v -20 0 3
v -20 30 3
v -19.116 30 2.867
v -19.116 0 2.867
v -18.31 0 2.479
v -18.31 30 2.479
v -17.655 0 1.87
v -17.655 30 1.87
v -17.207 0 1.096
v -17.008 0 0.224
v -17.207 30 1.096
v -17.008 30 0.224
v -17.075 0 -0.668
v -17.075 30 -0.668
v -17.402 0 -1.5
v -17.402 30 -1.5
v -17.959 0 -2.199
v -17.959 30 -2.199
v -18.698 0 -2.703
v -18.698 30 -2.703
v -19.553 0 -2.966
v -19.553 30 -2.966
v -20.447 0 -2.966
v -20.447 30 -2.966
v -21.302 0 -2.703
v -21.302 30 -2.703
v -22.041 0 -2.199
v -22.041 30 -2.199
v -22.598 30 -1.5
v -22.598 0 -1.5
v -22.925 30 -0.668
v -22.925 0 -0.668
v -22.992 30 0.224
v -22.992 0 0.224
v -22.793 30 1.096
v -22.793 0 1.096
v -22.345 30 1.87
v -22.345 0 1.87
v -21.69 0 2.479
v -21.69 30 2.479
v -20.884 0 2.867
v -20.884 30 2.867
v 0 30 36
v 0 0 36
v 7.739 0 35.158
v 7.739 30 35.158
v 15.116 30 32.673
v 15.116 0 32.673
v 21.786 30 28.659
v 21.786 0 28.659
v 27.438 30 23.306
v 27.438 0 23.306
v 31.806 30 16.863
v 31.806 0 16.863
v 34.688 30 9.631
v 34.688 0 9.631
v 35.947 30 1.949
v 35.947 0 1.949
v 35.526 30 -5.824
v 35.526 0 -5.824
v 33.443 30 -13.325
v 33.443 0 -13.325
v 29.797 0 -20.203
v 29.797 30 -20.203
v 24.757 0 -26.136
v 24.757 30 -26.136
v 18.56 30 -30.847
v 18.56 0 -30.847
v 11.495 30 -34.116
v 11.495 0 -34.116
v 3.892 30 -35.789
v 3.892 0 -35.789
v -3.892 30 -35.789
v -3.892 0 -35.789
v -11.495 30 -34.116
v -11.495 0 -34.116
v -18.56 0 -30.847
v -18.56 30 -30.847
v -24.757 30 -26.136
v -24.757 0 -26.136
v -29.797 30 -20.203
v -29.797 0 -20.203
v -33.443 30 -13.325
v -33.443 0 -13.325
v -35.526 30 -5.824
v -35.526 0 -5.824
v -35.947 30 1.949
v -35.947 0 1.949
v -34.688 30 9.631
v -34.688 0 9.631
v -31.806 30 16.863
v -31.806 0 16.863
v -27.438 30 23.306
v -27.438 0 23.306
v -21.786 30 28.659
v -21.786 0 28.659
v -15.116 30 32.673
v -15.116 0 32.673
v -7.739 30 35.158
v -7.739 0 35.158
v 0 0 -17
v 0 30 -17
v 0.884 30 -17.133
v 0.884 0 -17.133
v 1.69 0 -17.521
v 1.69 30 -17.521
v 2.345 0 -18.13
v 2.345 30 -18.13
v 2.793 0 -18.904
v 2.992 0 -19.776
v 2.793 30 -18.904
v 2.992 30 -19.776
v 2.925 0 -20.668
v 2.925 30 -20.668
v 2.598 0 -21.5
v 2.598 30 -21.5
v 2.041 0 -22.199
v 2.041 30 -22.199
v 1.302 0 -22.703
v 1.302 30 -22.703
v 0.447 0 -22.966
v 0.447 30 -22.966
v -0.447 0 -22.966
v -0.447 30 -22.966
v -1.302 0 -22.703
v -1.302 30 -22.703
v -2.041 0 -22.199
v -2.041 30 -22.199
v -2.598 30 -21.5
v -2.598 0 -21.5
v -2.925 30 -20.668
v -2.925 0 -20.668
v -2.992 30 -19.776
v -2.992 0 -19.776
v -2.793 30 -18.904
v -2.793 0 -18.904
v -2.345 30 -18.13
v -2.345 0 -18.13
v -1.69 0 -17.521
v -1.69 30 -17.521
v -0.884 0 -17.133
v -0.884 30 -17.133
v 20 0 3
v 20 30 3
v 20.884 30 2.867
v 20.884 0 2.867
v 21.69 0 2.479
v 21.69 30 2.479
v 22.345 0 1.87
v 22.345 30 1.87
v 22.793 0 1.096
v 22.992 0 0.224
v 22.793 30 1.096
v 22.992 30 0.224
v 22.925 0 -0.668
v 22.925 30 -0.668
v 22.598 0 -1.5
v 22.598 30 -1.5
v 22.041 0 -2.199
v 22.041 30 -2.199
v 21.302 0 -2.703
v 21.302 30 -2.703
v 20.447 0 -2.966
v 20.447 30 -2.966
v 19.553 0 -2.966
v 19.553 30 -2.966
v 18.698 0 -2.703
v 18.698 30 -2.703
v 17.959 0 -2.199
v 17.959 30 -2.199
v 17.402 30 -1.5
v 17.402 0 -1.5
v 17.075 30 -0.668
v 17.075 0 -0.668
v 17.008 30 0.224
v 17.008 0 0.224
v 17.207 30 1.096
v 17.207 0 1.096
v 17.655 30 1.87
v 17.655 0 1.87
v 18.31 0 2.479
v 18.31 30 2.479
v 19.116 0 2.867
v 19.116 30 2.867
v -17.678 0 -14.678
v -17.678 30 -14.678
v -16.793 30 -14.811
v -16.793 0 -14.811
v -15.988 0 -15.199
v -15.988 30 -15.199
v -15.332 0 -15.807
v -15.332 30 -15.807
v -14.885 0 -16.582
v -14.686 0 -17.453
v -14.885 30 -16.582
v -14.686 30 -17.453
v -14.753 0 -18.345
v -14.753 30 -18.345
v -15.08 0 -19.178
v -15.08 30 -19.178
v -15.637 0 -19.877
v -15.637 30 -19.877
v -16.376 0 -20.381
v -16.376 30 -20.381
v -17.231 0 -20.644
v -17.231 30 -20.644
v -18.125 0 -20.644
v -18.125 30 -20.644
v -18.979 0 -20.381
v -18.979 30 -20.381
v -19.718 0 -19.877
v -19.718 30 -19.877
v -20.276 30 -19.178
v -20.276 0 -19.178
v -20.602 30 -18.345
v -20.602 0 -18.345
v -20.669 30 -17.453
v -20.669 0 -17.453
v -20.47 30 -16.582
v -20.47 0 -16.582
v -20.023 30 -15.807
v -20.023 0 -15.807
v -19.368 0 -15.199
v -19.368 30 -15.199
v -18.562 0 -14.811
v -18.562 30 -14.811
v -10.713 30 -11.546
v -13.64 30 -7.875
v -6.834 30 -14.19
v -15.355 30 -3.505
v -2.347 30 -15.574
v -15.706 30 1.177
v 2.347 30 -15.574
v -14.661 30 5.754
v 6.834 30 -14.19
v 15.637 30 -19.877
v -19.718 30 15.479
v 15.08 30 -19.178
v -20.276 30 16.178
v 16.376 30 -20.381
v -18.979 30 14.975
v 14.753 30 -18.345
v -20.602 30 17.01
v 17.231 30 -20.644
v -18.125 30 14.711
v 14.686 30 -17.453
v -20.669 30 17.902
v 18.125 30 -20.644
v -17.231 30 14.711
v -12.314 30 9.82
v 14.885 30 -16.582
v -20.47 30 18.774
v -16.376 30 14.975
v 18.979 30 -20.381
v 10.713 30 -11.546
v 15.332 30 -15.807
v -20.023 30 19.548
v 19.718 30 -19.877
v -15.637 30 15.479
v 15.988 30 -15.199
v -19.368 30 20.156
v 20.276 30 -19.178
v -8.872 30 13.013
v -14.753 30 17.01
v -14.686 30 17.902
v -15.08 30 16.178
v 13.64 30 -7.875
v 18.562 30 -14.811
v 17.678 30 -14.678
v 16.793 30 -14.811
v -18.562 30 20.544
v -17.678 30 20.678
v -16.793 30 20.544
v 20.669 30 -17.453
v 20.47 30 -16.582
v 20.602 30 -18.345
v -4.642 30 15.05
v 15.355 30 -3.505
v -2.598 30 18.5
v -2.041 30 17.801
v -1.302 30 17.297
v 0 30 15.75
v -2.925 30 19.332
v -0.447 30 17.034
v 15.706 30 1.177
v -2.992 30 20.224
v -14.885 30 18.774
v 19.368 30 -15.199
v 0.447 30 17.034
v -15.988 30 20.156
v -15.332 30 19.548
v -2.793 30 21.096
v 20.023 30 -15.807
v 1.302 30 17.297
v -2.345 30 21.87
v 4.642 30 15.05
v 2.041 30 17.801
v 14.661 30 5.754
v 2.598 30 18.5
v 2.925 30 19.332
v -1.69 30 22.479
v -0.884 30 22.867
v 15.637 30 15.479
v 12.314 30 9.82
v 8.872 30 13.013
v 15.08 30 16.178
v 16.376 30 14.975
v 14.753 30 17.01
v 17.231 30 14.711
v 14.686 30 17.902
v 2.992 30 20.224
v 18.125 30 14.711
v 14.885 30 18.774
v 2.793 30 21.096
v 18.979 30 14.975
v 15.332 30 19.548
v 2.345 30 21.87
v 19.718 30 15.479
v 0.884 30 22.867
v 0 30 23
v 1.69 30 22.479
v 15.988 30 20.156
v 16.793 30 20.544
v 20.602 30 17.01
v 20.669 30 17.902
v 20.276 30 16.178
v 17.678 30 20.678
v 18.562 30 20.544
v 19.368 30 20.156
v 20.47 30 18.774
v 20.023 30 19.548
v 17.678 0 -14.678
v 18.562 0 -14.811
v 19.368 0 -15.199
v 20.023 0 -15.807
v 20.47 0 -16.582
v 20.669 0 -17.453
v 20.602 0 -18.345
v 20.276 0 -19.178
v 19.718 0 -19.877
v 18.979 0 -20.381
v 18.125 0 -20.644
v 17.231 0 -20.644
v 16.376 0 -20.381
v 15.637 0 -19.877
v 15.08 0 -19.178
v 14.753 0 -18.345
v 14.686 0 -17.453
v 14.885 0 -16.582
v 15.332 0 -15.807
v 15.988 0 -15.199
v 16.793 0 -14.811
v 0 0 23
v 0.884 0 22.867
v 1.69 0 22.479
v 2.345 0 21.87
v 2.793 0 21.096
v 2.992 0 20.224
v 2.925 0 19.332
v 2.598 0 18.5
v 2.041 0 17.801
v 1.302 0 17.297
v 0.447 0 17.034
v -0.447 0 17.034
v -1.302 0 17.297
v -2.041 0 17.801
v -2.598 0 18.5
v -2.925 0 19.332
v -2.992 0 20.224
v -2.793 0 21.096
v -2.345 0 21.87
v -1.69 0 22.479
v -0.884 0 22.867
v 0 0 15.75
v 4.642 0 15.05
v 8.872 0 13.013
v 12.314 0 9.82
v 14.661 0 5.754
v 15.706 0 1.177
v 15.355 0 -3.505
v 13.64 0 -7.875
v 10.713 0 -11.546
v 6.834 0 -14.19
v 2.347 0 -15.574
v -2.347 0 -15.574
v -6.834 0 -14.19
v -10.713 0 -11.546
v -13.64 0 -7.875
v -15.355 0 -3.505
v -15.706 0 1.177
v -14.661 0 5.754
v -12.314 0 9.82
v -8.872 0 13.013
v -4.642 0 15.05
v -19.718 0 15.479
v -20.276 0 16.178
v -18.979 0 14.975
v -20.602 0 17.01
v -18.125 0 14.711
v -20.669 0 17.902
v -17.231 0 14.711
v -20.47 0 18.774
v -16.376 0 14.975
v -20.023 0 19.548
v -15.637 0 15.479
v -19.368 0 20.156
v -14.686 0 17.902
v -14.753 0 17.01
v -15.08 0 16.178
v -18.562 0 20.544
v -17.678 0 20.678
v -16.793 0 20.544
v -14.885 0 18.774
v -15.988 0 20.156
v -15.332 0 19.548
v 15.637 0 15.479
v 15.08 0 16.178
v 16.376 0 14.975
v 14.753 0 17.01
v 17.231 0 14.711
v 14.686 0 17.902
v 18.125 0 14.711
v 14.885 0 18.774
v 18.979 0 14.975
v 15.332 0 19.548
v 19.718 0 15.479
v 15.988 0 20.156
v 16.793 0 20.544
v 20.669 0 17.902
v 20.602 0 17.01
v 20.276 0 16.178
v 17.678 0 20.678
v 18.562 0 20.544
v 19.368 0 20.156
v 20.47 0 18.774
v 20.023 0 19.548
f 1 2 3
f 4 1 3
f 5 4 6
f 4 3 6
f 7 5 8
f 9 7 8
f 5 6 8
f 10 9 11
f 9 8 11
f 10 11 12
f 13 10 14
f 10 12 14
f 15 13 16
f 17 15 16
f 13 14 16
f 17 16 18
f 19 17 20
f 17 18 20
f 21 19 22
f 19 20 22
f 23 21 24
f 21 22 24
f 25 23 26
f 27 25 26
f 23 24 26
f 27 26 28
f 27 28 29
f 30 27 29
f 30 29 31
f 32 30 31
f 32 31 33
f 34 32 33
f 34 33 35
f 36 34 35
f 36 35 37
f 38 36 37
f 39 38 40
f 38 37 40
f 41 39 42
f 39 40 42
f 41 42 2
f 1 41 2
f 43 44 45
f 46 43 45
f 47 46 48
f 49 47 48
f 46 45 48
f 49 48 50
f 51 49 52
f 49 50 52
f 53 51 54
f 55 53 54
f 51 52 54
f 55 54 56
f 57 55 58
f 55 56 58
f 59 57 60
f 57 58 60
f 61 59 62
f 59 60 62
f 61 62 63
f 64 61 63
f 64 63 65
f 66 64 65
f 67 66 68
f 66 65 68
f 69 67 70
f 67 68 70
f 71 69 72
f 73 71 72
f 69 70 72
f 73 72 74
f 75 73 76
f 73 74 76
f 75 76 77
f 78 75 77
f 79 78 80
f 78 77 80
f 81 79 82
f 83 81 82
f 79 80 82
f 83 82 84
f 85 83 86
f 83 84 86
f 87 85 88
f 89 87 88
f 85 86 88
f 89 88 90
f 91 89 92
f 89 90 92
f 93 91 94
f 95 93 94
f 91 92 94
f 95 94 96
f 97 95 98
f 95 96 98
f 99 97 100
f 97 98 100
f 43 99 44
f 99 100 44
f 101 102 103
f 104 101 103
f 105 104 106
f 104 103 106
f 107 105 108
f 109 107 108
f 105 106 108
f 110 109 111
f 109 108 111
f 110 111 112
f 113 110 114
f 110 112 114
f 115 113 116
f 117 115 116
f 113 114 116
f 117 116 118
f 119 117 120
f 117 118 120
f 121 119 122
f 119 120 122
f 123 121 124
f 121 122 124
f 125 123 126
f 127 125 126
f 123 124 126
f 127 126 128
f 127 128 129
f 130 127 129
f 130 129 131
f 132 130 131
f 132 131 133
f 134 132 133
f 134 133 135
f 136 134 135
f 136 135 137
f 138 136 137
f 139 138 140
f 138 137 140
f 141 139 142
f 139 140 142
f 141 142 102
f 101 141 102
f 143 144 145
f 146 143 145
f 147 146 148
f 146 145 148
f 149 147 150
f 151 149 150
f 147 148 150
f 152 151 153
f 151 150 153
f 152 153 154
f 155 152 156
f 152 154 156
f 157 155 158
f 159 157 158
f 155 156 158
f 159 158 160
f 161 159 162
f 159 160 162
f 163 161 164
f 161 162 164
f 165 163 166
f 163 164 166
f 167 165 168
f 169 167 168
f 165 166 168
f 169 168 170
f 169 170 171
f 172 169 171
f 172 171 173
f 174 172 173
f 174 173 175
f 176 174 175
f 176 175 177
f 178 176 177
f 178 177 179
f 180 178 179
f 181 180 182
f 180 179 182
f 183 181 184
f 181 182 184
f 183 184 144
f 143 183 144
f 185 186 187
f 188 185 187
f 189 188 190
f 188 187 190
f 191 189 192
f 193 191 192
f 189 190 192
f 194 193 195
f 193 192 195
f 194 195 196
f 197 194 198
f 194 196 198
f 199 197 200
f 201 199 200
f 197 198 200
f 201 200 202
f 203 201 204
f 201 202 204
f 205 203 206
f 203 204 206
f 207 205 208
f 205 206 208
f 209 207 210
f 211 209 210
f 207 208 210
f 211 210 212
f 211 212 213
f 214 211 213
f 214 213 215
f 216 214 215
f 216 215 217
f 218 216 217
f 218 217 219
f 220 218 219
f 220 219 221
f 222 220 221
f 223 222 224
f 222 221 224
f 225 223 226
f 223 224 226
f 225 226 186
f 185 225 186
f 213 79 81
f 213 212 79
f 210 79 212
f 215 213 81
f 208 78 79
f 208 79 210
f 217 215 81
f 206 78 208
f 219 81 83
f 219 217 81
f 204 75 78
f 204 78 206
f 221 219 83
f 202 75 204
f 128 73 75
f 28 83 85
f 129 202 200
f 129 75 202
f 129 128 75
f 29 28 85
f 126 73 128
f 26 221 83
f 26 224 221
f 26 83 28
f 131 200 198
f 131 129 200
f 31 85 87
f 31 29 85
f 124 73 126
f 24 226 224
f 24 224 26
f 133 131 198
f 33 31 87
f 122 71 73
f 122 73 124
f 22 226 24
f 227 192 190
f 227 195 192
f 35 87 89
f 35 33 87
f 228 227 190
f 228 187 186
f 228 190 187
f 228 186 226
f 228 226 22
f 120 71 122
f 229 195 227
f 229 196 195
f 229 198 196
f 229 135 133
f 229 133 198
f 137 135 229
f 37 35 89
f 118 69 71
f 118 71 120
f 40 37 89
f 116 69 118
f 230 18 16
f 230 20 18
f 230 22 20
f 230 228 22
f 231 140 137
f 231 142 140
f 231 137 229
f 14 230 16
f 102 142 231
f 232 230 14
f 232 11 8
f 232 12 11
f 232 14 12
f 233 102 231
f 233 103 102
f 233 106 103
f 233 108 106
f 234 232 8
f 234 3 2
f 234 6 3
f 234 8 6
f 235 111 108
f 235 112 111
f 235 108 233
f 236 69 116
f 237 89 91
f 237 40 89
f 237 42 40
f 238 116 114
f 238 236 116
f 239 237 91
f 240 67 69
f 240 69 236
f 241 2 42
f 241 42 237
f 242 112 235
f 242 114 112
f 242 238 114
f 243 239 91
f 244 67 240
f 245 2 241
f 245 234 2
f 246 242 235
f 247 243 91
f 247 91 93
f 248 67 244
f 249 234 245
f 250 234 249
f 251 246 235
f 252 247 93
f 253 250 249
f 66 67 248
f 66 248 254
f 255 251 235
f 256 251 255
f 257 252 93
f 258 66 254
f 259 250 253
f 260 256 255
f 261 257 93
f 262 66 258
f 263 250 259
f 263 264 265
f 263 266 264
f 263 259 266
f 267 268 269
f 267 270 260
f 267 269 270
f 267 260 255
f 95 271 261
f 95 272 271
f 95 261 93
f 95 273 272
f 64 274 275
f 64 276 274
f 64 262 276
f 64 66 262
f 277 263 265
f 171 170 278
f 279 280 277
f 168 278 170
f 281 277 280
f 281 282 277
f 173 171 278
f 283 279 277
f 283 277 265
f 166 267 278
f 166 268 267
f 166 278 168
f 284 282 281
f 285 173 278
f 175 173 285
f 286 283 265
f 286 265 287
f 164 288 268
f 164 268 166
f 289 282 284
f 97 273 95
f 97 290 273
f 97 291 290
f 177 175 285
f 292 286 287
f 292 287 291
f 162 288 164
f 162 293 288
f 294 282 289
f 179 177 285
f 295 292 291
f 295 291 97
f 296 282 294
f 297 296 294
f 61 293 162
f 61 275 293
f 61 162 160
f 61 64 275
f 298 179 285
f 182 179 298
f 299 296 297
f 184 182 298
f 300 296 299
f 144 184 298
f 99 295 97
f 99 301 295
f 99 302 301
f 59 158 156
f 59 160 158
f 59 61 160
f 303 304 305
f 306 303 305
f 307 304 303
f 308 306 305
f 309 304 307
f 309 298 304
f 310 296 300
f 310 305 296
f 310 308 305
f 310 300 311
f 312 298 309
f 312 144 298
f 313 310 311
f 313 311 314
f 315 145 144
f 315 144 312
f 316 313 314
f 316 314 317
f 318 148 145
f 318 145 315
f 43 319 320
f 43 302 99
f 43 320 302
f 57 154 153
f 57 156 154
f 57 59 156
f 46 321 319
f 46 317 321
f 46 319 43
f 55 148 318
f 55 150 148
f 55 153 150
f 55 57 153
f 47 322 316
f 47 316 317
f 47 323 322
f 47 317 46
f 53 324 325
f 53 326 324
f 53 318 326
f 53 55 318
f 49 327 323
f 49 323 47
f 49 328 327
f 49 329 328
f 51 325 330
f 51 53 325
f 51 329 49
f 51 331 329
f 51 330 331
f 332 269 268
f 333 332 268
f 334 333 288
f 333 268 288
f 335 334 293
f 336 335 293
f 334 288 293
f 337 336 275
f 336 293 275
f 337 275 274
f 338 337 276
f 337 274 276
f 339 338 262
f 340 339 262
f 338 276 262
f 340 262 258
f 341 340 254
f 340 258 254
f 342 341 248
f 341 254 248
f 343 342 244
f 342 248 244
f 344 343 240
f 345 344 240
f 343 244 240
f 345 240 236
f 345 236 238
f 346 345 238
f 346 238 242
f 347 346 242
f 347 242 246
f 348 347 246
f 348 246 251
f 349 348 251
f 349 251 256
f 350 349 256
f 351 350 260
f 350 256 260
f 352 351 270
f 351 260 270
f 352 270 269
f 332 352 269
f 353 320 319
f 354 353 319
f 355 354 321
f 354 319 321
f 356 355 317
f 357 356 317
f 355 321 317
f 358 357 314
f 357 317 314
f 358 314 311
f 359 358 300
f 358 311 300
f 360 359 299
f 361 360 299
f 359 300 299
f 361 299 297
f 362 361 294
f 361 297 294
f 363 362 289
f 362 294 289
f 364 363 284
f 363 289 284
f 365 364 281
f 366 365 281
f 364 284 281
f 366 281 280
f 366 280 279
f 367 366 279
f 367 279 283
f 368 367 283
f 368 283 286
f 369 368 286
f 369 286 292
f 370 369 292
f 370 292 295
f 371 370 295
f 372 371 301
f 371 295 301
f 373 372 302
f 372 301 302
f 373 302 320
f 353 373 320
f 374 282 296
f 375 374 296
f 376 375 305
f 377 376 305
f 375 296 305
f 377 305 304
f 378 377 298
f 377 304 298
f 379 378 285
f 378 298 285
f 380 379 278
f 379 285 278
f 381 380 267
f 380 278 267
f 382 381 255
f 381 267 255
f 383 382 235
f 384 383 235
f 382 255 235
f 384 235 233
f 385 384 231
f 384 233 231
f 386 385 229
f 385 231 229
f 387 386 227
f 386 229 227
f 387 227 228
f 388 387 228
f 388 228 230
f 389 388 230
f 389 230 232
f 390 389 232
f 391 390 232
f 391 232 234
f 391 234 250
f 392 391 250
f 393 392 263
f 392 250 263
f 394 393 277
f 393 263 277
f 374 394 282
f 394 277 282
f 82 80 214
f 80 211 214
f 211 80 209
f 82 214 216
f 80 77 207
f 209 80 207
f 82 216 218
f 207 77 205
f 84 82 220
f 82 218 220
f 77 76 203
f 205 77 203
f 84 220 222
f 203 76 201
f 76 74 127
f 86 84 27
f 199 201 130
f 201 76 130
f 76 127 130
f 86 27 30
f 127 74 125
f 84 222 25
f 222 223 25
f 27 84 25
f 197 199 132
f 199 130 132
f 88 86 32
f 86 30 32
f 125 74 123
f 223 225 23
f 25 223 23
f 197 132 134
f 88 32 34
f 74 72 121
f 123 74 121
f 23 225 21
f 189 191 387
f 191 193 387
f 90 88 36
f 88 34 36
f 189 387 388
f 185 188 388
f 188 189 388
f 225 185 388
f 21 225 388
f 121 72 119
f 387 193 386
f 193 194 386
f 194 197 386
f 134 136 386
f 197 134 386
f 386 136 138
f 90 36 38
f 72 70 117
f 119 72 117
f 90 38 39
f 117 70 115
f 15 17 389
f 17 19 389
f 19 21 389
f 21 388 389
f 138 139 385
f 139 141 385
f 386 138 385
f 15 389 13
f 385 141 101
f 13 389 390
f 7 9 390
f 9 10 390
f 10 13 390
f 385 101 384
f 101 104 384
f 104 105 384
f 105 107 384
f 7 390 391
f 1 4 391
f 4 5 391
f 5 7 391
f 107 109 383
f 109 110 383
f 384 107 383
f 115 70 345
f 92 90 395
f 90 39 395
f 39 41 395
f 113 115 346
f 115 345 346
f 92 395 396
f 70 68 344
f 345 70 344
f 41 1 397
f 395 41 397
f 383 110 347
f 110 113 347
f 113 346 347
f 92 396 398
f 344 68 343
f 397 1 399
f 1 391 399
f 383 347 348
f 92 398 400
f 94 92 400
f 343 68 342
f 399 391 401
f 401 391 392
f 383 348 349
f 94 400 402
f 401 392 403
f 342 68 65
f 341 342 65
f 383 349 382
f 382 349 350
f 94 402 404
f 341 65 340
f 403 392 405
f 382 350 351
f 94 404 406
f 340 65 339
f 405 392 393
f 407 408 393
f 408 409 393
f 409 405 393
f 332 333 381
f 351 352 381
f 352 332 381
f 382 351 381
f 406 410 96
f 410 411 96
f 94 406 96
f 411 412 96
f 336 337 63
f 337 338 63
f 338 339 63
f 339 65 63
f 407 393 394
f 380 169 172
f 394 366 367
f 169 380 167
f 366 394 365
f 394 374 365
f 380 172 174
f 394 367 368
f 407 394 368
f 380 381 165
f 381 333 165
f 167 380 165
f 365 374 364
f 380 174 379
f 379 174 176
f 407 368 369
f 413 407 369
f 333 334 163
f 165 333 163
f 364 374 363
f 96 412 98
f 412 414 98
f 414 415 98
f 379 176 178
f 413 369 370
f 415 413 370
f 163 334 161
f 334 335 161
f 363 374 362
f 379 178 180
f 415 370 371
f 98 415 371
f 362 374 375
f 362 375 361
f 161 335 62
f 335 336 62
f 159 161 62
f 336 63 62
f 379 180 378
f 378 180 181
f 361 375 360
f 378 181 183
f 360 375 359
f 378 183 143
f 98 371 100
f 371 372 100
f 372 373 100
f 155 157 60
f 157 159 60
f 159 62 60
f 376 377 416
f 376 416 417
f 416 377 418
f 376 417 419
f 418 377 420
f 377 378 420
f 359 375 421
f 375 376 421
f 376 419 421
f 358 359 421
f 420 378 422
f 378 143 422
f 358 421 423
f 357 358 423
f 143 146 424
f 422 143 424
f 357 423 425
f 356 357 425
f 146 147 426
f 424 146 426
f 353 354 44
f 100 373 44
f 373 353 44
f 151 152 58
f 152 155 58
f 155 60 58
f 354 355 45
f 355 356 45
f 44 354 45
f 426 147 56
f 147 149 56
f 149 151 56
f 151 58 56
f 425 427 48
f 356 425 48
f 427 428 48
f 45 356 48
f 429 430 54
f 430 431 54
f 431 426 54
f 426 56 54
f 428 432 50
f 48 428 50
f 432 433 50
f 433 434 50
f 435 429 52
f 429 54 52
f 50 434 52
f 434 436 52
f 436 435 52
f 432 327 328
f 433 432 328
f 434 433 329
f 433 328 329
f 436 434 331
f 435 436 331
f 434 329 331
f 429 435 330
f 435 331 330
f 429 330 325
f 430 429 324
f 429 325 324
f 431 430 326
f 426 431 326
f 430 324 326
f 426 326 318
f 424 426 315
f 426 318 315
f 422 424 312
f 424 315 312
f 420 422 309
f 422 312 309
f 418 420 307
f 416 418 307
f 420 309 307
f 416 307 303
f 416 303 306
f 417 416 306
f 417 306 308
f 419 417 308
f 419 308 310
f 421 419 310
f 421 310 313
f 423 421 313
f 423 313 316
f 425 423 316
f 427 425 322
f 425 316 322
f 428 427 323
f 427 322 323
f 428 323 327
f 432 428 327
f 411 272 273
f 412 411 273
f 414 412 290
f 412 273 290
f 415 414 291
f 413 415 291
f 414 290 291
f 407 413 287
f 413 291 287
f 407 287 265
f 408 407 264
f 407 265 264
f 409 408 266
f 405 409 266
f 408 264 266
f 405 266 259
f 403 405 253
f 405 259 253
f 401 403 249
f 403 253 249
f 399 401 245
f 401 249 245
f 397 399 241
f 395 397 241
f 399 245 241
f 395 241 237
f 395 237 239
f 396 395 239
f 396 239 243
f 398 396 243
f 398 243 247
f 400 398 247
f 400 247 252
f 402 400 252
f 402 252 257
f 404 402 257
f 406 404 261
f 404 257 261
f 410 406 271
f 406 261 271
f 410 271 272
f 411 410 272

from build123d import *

# Parameters (mm, degrees)
SKETCH1_R           = 36
BOSS_EXTRUDE1_DEPTH = 30
SKETCH2_R           = 3
CUT_EXTRUDE1_DEPTH  = 30
SKETCH4_R           = 3
CUT_EXTRUDE2_DEPTH  = 30
SKETCH5_R           = 15.75
CUT_EXTRUDE3_DEPTH  = 30


with BuildPart() as part:
    # Sketch1 → Boss-Extrude1 (new body)
    with BuildSketch(Plane(origin=(0, 0, 0), x_dir=(1, 0, 0), z_dir=(0, 1, 0))):
        Circle(SKETCH1_R)
    extrude(amount=BOSS_EXTRUDE1_DEPTH)

    # Sketch2 → Cut-Extrude1 (cut)
    with BuildSketch(Plane(origin=(0, 30, 0), x_dir=(1, 0, 0), z_dir=(0, 1, 0))):
        with Locations((20, 0)):
            Circle(SKETCH2_R)
        with Locations((0, -20)):
            Circle(SKETCH2_R)
        with Locations((-20, 0)):
            Circle(SKETCH2_R)
        with Locations((0, 20)):
            Circle(SKETCH2_R)
    extrude(amount=-CUT_EXTRUDE1_DEPTH, mode=Mode.SUBTRACT)

    # Sketch4 → Cut-Extrude2 (cut)
    with BuildSketch(Plane(origin=(0, 30, 0), x_dir=(1, 0, 0), z_dir=(0, 1, 0))):
        with Locations((17.67766953, 17.67766953)):
            Circle(SKETCH4_R)
        with Locations((17.67766953, -17.67766953)):
            Circle(SKETCH4_R)
        with Locations((-17.67766953, -17.67766953)):
            Circle(SKETCH4_R)
        with Locations((-17.67766953, 17.67766953)):
            Circle(SKETCH4_R)
    extrude(amount=-CUT_EXTRUDE2_DEPTH, mode=Mode.SUBTRACT)

    # Sketch5 → Cut-Extrude3 (cut)
    with BuildSketch(Plane(origin=(0, 30, 0), x_dir=(1, 0, 0), z_dir=(0, 1, 0))):
        Circle(SKETCH5_R)
    extrude(amount=-CUT_EXTRUDE3_DEPTH, mode=Mode.SUBTRACT)


solid = part.part
